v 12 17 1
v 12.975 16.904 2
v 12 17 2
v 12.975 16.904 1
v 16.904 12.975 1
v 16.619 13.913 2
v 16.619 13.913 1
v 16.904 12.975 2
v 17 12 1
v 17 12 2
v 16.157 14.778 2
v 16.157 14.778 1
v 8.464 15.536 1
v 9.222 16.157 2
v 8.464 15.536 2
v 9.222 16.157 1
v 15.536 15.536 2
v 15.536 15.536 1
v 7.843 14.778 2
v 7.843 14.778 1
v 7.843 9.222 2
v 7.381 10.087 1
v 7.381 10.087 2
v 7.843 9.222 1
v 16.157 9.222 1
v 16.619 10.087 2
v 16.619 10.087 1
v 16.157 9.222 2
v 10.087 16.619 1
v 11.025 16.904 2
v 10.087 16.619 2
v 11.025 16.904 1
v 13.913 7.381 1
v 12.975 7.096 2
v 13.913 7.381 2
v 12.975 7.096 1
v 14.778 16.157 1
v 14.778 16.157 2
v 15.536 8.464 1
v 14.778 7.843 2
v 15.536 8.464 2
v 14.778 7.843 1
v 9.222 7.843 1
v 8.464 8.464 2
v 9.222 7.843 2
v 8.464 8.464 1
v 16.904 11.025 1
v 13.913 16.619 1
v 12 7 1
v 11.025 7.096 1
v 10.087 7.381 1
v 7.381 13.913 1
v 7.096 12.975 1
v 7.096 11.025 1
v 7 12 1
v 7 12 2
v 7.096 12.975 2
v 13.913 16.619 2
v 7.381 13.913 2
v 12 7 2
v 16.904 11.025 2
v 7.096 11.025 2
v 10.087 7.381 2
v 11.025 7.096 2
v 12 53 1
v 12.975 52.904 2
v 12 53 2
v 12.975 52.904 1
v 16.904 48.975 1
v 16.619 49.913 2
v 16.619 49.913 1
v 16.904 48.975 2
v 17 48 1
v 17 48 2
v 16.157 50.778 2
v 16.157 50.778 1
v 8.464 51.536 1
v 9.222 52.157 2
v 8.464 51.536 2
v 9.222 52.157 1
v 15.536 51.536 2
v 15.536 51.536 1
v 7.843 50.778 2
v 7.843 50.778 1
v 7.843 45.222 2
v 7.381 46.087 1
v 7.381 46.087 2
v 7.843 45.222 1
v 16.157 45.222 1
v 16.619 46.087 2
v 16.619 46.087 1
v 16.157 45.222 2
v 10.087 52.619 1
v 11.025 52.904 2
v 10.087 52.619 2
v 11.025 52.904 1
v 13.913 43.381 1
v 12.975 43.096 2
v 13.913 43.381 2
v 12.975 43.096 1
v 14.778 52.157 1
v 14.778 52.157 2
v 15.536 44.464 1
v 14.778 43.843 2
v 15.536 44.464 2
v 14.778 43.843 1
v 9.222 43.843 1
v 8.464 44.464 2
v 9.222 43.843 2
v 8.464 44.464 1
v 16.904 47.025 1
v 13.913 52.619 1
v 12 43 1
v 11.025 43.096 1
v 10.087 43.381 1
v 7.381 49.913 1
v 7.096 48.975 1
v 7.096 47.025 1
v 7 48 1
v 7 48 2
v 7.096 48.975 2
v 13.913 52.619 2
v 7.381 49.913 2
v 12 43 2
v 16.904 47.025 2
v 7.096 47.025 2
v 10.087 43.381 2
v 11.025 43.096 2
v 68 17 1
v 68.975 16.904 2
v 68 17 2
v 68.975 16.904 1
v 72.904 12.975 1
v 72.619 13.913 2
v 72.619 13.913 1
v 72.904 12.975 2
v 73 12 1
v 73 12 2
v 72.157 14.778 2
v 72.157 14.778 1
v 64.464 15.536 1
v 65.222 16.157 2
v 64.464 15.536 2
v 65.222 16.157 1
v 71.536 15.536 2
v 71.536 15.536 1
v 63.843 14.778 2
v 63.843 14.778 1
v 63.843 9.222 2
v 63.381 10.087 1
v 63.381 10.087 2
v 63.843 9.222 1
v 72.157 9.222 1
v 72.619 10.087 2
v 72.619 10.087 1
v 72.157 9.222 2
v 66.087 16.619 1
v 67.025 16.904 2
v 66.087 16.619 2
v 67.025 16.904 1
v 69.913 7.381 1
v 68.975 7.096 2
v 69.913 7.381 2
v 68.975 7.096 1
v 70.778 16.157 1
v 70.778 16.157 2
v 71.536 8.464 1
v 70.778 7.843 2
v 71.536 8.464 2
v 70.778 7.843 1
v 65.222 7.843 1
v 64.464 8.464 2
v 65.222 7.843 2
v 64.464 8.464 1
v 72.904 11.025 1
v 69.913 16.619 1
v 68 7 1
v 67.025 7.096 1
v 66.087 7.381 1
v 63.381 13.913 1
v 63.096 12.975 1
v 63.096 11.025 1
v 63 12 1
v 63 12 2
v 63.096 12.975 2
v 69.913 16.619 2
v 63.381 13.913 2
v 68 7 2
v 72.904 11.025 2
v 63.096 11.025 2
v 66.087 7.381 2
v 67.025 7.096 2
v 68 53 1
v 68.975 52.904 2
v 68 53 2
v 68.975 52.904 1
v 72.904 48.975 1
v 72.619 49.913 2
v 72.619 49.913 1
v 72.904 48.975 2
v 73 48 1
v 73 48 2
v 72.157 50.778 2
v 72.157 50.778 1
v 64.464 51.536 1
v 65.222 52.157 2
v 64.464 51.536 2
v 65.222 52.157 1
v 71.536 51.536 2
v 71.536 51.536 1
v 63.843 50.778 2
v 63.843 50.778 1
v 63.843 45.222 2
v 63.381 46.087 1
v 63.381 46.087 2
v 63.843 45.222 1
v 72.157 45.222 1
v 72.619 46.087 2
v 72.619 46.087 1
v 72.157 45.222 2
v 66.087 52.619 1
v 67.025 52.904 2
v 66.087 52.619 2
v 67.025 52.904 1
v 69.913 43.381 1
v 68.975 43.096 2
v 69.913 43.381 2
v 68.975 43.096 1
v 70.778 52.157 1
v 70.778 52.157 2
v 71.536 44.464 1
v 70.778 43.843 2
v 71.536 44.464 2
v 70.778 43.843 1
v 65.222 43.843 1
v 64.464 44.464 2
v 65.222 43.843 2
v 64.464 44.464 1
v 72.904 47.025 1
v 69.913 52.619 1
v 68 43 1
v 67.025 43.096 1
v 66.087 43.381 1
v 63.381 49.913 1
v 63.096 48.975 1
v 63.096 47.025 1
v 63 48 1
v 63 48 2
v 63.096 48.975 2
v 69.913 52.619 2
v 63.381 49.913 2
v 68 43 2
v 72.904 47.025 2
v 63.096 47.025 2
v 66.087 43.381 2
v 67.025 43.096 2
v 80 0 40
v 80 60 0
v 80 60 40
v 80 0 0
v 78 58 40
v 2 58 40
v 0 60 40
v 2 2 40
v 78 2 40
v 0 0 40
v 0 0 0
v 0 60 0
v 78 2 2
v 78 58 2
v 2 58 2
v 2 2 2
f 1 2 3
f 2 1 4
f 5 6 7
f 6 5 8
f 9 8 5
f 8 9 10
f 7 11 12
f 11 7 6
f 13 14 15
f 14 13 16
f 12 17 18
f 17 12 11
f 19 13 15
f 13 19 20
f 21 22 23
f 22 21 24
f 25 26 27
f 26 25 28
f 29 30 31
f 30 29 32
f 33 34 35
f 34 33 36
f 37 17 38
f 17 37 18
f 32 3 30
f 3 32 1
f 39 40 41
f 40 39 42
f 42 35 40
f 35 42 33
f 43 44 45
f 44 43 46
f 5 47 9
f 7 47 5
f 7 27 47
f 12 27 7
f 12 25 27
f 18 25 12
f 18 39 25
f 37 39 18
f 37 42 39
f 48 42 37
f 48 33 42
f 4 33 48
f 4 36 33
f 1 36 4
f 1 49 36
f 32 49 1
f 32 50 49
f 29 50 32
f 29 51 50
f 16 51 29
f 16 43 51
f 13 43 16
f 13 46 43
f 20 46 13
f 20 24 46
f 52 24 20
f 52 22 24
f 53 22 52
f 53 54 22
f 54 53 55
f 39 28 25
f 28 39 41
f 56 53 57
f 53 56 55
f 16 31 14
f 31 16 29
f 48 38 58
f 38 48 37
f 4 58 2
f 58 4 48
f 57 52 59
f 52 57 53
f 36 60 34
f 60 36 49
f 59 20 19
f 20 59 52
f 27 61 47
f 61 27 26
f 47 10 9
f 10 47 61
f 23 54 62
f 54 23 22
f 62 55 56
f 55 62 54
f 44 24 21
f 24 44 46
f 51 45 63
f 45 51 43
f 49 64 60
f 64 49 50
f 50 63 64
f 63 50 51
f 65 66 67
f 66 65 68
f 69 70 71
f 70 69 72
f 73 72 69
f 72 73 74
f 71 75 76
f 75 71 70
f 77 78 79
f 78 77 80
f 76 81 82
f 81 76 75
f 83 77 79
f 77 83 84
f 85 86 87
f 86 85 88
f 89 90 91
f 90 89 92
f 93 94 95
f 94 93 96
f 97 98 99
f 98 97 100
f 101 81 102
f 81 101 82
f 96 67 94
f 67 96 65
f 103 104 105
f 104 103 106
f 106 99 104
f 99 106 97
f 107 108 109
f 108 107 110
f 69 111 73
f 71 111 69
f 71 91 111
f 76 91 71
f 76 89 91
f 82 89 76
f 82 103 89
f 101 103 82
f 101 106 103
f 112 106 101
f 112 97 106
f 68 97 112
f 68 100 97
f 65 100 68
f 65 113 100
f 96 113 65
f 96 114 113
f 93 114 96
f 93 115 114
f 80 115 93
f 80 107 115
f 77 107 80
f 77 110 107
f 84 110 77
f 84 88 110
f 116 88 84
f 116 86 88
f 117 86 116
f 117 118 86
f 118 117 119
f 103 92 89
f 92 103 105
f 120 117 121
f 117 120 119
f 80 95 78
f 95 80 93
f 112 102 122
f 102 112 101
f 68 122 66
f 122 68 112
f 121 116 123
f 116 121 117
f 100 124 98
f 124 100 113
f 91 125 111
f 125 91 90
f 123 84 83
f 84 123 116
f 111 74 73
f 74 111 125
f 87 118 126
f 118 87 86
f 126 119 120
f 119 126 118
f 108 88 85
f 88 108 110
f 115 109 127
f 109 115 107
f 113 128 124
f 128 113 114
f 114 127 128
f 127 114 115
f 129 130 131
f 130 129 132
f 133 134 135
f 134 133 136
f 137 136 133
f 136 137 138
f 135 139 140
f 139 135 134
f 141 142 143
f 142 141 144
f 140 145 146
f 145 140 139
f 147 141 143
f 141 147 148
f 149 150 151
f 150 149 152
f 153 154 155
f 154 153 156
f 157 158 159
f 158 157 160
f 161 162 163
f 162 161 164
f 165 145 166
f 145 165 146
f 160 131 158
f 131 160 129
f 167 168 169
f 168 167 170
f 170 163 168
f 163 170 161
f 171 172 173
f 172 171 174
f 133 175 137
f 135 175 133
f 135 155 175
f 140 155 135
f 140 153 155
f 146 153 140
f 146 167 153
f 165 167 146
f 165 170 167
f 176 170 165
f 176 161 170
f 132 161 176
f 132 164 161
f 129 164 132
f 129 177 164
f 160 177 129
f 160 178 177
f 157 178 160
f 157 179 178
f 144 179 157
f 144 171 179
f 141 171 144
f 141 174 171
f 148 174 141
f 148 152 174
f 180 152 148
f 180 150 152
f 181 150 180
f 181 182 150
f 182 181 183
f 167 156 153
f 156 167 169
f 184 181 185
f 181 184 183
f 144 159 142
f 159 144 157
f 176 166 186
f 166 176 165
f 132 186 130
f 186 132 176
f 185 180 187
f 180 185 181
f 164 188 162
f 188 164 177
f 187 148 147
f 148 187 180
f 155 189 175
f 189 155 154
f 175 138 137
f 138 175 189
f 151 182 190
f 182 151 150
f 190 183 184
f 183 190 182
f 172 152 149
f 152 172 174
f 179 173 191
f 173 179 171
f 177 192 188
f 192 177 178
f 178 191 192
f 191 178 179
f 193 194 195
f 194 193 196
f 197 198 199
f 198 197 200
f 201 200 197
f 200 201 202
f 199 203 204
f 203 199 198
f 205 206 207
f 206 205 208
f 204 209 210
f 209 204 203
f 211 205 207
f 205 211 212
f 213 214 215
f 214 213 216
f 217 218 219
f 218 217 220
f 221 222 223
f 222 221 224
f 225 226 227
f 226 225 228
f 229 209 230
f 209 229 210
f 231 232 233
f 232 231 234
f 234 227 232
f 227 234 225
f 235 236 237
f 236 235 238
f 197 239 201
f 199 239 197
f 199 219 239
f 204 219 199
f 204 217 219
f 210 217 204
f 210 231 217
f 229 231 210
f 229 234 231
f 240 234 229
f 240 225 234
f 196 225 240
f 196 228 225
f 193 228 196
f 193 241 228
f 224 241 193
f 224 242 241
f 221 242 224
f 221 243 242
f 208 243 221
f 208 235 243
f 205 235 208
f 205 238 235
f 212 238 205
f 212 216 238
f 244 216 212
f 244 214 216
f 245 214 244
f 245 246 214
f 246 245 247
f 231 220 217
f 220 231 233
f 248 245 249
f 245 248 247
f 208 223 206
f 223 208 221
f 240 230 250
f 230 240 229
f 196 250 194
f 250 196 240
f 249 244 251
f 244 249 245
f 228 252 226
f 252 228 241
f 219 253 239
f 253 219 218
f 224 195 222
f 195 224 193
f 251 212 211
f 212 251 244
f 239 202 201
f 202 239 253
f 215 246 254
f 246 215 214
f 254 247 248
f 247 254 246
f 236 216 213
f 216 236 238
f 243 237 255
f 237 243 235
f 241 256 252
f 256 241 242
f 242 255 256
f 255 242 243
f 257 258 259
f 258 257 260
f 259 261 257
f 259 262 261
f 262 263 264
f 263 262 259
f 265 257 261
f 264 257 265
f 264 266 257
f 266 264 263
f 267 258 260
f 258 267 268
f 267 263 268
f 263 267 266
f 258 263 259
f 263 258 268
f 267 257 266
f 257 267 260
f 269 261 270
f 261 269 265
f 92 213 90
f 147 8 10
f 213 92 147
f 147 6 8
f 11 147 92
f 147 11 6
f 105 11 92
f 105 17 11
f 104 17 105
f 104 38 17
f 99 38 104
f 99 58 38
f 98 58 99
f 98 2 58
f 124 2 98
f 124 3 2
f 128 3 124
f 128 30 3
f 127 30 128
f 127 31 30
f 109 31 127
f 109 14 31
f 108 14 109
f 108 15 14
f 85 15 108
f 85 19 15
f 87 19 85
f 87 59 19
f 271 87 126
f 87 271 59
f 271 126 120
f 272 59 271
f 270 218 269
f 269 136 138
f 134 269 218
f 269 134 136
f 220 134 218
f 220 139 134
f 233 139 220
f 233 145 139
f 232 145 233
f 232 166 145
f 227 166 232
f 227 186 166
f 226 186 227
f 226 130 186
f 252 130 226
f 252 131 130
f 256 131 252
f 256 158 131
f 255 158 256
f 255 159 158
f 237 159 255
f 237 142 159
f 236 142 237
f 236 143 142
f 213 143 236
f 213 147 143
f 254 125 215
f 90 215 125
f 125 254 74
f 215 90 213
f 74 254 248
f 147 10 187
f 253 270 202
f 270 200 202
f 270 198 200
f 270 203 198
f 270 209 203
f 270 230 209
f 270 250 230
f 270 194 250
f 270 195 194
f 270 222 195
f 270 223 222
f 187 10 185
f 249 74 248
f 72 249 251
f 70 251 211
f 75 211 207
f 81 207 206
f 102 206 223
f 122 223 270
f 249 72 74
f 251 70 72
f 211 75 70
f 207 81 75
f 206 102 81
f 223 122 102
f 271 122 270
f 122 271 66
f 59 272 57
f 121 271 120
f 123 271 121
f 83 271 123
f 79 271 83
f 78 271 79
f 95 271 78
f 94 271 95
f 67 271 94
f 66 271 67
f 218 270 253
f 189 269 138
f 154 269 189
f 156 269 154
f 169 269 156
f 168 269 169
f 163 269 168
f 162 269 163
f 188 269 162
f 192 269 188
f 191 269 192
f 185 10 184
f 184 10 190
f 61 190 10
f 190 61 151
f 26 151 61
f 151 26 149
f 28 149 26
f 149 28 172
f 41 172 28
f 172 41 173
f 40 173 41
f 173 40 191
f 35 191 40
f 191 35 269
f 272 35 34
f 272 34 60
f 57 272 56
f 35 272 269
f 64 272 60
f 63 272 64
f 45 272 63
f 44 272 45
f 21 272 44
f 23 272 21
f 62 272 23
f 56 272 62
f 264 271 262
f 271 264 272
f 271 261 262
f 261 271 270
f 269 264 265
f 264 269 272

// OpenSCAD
$fn = 32;

// ----------------------------------------------------------------------
// Enclosure box: bosses enclosure
// ----------------------------------------------------------------------

// --- parameters (mm) ---
box_l = 80;               // outer length, X
box_w = 60;               // outer width, Y
box_h = 40;               // outer height
wall_t = 2;               // wall thickness
boss_r = 5;               // corner boss radius
hole_r = 2;               // boss screw hole radius
boss_in = 12;             // boss inset from the corners

inner_h = box_h - wall_t;  // cavity depth
boss_h = inner_h - 2;  // corner boss height

difference() {
  cube([box_l, box_w, box_h]);
  translate([wall_t, wall_t, wall_t])
    cube([box_l - 2 * wall_t, box_w - 2 * wall_t, box_h]);
  for (sx = [0, 1], sy = [0, 1])
    translate([sx ? box_l - boss_in : boss_in,
               sy ? box_w - boss_in : boss_in, wall_t - 1]) {
      cylinder(r = boss_r, h = boss_h);
      translate([0, 0, boss_h - 4])
        cylinder(r = hole_r, h = 5);
    }
}
